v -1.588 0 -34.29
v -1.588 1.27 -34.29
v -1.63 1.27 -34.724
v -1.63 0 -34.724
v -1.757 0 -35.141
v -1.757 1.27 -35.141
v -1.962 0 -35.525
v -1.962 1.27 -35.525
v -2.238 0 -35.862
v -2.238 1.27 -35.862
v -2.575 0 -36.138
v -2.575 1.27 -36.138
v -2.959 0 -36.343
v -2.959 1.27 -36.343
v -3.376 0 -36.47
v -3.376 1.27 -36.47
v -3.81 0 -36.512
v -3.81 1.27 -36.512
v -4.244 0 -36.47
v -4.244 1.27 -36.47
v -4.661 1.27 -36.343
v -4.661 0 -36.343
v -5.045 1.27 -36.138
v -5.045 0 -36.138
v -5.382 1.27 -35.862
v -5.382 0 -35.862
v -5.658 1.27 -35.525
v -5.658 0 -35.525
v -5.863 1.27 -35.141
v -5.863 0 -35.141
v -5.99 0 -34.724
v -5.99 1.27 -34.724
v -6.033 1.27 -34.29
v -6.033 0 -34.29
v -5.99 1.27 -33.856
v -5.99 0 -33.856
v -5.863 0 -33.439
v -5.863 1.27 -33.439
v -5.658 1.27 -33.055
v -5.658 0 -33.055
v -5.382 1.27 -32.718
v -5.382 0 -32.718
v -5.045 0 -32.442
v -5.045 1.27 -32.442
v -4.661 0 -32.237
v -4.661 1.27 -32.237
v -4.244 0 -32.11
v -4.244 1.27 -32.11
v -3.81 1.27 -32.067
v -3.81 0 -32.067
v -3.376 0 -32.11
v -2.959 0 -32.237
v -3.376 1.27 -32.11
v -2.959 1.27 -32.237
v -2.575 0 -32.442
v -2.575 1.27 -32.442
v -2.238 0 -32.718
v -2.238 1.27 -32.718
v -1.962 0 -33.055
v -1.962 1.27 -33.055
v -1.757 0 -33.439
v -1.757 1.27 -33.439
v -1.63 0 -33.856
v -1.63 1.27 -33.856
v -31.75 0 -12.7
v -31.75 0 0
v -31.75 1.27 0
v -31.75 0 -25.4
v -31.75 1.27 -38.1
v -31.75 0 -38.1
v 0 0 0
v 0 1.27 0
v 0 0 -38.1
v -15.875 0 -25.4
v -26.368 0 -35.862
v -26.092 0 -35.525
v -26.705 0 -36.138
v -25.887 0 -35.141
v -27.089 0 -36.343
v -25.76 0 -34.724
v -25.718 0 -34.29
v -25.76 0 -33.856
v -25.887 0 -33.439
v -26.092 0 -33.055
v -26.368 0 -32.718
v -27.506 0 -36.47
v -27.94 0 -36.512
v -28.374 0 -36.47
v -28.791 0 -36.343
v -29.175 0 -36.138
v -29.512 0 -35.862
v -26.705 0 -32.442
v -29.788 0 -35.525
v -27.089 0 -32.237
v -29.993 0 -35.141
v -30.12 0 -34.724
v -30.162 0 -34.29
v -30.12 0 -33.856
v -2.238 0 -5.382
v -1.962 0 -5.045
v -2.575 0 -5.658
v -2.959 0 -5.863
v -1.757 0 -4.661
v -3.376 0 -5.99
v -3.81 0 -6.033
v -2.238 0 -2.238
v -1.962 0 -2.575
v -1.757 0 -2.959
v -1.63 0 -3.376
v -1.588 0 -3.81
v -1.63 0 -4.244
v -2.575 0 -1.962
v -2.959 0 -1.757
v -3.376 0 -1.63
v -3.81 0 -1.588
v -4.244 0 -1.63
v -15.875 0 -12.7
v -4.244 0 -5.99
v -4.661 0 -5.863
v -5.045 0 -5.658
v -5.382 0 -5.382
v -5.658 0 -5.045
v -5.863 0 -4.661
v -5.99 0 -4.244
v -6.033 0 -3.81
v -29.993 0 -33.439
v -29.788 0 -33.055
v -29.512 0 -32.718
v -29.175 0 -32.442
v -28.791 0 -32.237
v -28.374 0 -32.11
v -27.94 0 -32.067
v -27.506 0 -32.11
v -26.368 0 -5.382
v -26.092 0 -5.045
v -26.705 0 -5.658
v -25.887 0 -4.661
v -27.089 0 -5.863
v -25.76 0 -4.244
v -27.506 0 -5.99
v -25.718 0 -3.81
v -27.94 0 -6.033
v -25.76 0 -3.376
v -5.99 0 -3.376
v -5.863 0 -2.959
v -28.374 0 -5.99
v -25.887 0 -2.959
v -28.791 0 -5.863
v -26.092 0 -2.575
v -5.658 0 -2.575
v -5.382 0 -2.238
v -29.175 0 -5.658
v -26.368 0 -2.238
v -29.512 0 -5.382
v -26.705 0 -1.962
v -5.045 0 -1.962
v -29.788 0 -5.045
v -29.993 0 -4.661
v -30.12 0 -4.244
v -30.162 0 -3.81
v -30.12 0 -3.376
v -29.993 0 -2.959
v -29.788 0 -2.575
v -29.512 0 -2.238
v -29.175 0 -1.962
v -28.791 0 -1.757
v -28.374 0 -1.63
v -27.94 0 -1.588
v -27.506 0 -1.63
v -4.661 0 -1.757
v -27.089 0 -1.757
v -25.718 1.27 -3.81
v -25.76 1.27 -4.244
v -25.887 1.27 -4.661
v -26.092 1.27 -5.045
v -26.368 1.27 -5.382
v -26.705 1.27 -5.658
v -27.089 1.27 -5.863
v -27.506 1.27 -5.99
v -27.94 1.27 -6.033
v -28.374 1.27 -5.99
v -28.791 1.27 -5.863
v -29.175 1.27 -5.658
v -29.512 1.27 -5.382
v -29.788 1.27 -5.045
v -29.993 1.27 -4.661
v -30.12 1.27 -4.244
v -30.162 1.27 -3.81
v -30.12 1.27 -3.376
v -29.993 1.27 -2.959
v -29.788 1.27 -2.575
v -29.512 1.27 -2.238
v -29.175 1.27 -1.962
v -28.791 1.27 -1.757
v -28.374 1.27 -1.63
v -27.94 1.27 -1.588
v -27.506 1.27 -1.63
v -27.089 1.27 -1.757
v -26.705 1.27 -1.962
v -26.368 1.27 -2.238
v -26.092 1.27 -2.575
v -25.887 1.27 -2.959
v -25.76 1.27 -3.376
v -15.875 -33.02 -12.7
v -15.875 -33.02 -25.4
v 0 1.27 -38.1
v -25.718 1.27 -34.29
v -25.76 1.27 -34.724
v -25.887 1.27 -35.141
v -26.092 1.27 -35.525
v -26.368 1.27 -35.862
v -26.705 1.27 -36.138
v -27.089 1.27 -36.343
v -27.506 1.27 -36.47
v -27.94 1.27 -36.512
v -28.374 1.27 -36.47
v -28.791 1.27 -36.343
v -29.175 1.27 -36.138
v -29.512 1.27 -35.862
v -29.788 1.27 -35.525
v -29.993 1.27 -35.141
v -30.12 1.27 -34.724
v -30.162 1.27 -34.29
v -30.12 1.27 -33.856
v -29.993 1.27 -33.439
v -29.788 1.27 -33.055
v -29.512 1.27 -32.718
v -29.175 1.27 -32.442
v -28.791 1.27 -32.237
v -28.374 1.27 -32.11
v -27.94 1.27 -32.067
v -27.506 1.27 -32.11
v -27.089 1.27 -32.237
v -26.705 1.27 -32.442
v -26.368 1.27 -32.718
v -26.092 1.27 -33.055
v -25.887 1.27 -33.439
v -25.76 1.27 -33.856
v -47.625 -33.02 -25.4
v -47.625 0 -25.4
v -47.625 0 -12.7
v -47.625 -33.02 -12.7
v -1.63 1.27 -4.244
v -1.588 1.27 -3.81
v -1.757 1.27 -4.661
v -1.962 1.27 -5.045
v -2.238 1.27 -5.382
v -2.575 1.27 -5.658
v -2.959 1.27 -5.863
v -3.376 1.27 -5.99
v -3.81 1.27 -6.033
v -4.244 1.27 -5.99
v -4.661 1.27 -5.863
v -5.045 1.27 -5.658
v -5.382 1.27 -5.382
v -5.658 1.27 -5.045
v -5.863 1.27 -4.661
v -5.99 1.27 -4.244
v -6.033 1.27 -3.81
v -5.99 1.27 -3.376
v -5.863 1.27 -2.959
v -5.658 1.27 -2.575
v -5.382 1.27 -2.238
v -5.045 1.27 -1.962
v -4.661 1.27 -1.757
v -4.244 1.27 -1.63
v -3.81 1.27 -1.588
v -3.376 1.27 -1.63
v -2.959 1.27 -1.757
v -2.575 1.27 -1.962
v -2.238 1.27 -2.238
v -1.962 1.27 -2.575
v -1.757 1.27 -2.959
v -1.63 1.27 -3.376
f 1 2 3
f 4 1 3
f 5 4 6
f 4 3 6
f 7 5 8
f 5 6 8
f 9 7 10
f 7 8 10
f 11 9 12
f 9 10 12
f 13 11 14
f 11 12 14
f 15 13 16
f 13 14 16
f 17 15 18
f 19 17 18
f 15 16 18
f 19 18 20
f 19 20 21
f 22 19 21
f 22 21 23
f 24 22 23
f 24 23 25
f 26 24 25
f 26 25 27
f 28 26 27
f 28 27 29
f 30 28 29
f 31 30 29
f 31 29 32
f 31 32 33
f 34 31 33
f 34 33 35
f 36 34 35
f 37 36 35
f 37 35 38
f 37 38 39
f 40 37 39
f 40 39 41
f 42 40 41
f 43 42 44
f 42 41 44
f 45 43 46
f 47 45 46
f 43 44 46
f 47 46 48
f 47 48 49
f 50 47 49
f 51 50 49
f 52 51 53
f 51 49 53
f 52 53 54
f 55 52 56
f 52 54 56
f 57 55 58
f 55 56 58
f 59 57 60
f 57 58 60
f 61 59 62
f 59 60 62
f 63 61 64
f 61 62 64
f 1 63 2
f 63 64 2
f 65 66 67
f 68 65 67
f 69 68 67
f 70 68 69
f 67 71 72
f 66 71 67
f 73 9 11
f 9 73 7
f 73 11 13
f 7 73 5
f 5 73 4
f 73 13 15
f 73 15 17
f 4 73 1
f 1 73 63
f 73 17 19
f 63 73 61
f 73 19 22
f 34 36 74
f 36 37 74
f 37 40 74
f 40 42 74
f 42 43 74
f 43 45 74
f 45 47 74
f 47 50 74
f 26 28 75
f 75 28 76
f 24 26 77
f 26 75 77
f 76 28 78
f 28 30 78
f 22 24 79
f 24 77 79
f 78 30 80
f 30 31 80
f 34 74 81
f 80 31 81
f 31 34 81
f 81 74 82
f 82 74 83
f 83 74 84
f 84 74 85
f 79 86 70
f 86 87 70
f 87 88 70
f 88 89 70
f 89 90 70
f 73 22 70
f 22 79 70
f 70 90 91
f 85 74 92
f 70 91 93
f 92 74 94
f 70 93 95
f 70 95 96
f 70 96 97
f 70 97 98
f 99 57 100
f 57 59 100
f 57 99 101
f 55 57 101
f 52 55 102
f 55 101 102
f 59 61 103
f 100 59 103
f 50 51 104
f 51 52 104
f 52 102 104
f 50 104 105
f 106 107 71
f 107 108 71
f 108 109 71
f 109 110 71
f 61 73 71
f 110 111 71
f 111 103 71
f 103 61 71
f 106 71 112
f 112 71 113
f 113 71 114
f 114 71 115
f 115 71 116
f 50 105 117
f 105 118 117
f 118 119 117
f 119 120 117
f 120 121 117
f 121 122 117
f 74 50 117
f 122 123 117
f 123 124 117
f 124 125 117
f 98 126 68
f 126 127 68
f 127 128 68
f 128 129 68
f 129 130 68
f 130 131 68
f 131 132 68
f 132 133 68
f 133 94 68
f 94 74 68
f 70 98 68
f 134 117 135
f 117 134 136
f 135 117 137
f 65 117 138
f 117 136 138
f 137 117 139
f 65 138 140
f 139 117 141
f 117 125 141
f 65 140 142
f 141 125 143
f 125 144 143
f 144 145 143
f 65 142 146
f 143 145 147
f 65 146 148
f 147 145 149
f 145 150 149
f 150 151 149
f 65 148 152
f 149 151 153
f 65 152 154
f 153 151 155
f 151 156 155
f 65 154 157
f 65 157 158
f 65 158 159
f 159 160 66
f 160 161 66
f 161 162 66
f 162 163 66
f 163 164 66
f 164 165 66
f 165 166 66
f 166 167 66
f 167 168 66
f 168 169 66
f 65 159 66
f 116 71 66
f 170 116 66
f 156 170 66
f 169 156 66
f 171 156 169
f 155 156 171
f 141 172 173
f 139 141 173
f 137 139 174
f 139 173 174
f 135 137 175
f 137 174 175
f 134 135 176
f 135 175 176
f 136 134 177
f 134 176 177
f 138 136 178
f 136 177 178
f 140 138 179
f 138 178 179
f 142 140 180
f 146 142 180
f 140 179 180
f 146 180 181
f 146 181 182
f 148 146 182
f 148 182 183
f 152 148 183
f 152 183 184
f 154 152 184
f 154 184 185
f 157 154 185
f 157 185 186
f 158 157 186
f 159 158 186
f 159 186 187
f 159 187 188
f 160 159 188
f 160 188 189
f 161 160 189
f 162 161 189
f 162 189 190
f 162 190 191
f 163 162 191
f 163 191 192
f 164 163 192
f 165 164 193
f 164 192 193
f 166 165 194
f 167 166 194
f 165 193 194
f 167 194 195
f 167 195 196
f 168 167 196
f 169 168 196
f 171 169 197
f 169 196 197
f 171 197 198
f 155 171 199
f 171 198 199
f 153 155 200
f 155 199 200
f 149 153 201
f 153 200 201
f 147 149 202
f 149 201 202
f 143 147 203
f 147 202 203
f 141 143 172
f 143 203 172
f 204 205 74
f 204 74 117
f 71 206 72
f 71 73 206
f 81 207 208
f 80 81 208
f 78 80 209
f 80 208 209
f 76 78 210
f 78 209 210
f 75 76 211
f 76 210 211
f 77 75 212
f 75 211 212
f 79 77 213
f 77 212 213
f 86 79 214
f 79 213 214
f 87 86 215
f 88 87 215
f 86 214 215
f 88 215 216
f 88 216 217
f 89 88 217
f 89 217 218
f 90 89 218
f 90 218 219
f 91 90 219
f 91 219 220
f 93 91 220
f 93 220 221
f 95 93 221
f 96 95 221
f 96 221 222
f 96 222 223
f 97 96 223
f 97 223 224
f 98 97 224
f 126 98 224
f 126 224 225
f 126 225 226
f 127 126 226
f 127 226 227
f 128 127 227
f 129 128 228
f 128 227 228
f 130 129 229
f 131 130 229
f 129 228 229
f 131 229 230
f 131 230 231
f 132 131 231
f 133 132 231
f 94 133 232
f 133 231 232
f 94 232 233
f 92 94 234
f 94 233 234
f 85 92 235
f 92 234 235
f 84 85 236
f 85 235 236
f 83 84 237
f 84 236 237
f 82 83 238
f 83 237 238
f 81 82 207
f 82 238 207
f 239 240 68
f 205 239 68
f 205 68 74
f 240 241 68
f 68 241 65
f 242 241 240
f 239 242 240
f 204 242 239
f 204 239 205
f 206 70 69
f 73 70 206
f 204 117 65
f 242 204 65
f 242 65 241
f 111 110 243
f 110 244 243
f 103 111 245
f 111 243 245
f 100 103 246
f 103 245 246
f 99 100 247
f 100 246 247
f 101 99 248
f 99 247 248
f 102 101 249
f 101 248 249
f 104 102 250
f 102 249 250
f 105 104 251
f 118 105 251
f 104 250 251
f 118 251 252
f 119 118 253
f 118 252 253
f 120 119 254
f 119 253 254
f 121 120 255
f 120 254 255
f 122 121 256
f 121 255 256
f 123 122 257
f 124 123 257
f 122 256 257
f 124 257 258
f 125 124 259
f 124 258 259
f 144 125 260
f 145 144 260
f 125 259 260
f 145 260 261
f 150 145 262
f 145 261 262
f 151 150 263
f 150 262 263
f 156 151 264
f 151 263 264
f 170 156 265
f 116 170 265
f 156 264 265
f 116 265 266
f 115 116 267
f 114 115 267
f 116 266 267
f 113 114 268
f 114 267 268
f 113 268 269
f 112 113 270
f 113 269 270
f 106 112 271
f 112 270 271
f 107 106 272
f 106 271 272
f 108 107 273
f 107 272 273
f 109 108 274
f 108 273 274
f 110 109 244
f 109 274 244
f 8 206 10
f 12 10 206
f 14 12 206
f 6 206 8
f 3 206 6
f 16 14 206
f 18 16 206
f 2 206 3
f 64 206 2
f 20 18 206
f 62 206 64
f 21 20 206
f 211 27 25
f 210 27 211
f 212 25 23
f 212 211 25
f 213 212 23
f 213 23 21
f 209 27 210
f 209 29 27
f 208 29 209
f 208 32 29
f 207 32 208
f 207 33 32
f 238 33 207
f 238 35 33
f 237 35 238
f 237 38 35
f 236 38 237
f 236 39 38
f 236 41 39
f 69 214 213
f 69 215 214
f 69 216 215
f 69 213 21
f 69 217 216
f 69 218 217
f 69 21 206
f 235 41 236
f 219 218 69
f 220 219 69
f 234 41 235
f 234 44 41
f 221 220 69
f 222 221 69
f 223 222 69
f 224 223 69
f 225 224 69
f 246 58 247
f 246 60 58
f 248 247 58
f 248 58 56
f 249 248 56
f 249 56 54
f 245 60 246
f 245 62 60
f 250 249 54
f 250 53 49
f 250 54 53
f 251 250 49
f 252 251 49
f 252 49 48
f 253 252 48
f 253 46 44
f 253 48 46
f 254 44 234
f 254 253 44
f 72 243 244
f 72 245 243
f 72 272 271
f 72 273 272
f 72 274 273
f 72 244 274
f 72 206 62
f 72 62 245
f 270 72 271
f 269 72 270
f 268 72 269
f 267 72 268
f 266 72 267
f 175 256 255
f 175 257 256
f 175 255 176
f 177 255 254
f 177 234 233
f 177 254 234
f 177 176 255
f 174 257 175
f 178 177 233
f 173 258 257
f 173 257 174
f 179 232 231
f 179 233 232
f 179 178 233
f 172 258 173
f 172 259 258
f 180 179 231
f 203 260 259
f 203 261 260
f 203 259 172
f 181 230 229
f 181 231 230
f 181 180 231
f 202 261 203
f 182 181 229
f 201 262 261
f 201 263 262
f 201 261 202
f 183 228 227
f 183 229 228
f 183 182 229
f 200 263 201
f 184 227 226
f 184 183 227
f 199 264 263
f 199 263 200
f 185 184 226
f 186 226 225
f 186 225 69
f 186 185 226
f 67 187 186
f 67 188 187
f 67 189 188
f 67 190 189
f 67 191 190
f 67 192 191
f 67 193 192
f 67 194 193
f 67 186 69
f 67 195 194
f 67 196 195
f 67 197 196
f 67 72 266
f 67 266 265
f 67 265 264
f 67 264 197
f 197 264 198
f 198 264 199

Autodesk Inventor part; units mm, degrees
ref_plane "YZ Plane" through (0, 0, 0) normal (1, 0, 0) x (0, 1, 0)
ref_plane "XZ Plane" through (0, 0, 0) normal (0, 1, 0) x (-1, 0, 0)
ref_plane "XY Plane" through (0, 0, 0) normal (0, 0, 1) x (1, 0, 0)
sketch "Sketch1" plane through (0, 0, 0) normal (0, 1, 0) x (-1, 0, 0)
  line L0 (0, 0) -> (31.75, 0)
  line L1 (31.75, 0) -> (31.75, -38.1)
  line L2 (31.75, -38.1) -> (0, -38.1)
  line L3 (0, -38.1) -> (0, 0)
  dimension "d0" = 38.1
  dimension "d1" = 31.75
extrude "Extrusion1" add sketch "Sketch1" along normal blind 1.27
sketch "Sketch2" plane through (0, 1.27, 0) normal (0, 1, 0) x (1, 0, 0)
  circle A0 centre (-27.94, 3.81) radius 2.2225
  line L0 (-31.75, 38.1) -> (-31.75, 0) projected
  line L1 (-31.75, 19.05) -> (0, 19.05) construction
  line L2 (-31.75, 0) -> (0, 0) projected
  line L3 (-15.875, 0) -> (-15.875, 38.1) construction
  line L4 (0, 38.1) -> (-31.75, 38.1) projected
  circle A1 centre (-27.94, 34.29) radius 2.2225
  circle A2 centre (-3.81, 3.81) radius 2.2225
  circle A3 centre (-3.81, 34.29) radius 2.2225
  point P0 (-15.875, 19.05)
  dimension "d4" = 3.81
  dimension "d5" = 3.81
  dimension "d6" = 4.445
extrude "Extrusion2" cut sketch "Sketch2" against normal blind 1.27
sketch "Sketch3" plane through (0, 0, 0) normal (0, -1, 0) x (1, 0, 0)
  line L0 (-15.875, -25.4) -> (-15.875, -12.7)
  line L1 (-31.75, -38.1) -> (0, -38.1) projected
  line L2 (0, -38.1) -> (0, 0) projected
  line L3 (-15.875, -12.7) -> (-47.625, -12.7)
  line L4 (-47.625, -12.7) -> (-47.625, -25.4)
  line L5 (-47.625, -25.4) -> (-15.875, -25.4)
  line L6 (-15.875, -25.4) -> (-15.875, -12.7)
  dimension "d9" = 12.7
  dimension "d14" = 15.875
  dimension "d15" = 31.75
extrude "Extrusion3" add sketch "Sketch3" along normal blind 33.02
properties part number "caster"
